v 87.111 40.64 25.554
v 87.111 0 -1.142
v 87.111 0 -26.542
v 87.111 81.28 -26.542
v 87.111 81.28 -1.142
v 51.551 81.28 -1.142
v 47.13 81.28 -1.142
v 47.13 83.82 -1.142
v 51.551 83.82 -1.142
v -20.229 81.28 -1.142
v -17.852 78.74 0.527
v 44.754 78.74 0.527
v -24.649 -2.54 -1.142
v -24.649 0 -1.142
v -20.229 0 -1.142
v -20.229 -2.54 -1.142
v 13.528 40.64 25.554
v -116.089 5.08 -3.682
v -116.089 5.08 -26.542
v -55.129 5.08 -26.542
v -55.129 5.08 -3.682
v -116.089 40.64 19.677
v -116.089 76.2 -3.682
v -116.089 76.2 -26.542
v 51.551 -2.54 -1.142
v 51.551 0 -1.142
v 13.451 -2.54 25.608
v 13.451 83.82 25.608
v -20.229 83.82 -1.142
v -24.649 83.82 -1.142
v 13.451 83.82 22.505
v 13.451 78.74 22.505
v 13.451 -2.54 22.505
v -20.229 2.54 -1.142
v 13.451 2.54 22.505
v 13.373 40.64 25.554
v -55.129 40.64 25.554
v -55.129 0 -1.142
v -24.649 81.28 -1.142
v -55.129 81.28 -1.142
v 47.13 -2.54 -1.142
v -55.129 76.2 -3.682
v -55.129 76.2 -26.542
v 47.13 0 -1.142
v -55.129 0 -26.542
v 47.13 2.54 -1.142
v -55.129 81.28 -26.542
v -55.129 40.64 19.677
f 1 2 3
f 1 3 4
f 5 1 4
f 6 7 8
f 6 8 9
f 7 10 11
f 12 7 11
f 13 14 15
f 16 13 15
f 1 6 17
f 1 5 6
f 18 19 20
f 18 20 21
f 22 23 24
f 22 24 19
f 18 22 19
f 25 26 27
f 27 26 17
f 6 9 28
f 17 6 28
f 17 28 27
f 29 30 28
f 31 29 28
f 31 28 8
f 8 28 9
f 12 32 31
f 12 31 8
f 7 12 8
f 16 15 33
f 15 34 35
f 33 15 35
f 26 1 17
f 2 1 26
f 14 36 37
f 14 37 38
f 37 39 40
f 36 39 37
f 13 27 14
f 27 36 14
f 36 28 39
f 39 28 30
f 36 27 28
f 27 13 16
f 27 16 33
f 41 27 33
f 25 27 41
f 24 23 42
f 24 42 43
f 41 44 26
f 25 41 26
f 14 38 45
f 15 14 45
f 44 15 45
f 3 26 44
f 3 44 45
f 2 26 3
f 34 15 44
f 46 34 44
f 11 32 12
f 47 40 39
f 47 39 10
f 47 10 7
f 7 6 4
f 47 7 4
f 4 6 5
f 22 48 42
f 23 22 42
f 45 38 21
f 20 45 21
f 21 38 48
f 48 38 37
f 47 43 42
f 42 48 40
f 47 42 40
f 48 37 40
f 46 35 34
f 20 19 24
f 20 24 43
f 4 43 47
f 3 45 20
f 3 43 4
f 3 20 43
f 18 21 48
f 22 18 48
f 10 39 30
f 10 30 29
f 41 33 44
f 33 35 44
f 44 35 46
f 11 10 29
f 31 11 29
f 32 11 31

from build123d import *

# Parameters (mm, degrees)
F0_W      = 203.2
F0_H      = 25.4
F1_DEPTH  = 81.28
F3_DEPTH  = 203.2
F5_DEPTH  = 83.82
F6_DEPTH  = 78.74
F7_DEPTH  = 2.54
F8_DEPTH  = 2.54
F9_DEPTH  = 60.96
F11_DEPTH = 60.96


with BuildPart() as f1:
    # F0 (on Front) → F1 (new body)
    with BuildSketch(Plane.XZ):
        with Locations((-14.4892223179, -13.8418302595)):
            Rectangle(F0_W, F0_H)
    extrude(amount=-F1_DEPTH)

    # F2 (on face) → F3 (join)
    with BuildSketch(Plane.YZ.offset(87.1107776821)):
        Polygon((0, -1.1418302595), (81.28, -1.1418302595), (40.64, 25.5536600589), align=None)
    extrude(amount=-F3_DEPTH)

    # F4 (on face) → F5 (join)
    with BuildSketch(Plane.XZ):
        Polygon((13.4507776821, 25.6081018597), (-24.6492223179, -1.1418302595), (-20.2288646721, -1.1418302595), (13.4507776821, 22.5045777922), (47.1304200362, -1.1418302595), (51.5507776821, -1.1418302595), align=None)
    extrude(amount=-F5_DEPTH)

    # F4 (on face) → F6 (join)
    with BuildSketch(Plane.XZ):
        Polygon((13.4507776821, 22.5045777922), (-20.2288646721, -1.1418302595), (47.1304200362, -1.1418302595), align=None)
    extrude(amount=-F6_DEPTH)

    # F4 (on face) → F7 (cut)
    with BuildSketch(Plane.XZ):
        Polygon((13.4507776821, 22.5045777922), (-20.2288646721, -1.1418302595), (47.1304200362, -1.1418302595), align=None)
    extrude(amount=-F7_DEPTH, mode=Mode.SUBTRACT)

    # F4 (on face) → F8 (join)
    with BuildSketch(Plane.XZ):
        Polygon((13.4507776821, 25.6081018597), (-24.6492223179, -1.1418302595), (-20.2288646721, -1.1418302595), (13.4507776821, 22.5045777922), (47.1304200362, -1.1418302595), (51.5507776821, -1.1418302595), align=None)
    extrude(amount=F8_DEPTH)

    # F9 (cut): a face of the model
    f9_faces = [f1.faces().sort_by_distance(p)[0] for p in [
        (-116.0892223179, 40.64, -6.4016236214),
    ]]
    extrude(f9_faces, amount=-F9_DEPTH, mode=Mode.SUBTRACT)

    # F10 (on face) → F11 (join)
    with BuildSketch(Plane(origin=(-55.1292223179, 0, 0), x_dir=(0, -1, 0), z_dir=(-1, 0, 0))):
        Polygon((-40.64, 19.6767237691), (-76.2, -3.6818302595), (-76.2, -26.5418302595), (-5.08, -26.5418302595), (-5.08, -3.6818302595), align=None)
    extrude(amount=F11_DEPTH)


solid = f1.part
